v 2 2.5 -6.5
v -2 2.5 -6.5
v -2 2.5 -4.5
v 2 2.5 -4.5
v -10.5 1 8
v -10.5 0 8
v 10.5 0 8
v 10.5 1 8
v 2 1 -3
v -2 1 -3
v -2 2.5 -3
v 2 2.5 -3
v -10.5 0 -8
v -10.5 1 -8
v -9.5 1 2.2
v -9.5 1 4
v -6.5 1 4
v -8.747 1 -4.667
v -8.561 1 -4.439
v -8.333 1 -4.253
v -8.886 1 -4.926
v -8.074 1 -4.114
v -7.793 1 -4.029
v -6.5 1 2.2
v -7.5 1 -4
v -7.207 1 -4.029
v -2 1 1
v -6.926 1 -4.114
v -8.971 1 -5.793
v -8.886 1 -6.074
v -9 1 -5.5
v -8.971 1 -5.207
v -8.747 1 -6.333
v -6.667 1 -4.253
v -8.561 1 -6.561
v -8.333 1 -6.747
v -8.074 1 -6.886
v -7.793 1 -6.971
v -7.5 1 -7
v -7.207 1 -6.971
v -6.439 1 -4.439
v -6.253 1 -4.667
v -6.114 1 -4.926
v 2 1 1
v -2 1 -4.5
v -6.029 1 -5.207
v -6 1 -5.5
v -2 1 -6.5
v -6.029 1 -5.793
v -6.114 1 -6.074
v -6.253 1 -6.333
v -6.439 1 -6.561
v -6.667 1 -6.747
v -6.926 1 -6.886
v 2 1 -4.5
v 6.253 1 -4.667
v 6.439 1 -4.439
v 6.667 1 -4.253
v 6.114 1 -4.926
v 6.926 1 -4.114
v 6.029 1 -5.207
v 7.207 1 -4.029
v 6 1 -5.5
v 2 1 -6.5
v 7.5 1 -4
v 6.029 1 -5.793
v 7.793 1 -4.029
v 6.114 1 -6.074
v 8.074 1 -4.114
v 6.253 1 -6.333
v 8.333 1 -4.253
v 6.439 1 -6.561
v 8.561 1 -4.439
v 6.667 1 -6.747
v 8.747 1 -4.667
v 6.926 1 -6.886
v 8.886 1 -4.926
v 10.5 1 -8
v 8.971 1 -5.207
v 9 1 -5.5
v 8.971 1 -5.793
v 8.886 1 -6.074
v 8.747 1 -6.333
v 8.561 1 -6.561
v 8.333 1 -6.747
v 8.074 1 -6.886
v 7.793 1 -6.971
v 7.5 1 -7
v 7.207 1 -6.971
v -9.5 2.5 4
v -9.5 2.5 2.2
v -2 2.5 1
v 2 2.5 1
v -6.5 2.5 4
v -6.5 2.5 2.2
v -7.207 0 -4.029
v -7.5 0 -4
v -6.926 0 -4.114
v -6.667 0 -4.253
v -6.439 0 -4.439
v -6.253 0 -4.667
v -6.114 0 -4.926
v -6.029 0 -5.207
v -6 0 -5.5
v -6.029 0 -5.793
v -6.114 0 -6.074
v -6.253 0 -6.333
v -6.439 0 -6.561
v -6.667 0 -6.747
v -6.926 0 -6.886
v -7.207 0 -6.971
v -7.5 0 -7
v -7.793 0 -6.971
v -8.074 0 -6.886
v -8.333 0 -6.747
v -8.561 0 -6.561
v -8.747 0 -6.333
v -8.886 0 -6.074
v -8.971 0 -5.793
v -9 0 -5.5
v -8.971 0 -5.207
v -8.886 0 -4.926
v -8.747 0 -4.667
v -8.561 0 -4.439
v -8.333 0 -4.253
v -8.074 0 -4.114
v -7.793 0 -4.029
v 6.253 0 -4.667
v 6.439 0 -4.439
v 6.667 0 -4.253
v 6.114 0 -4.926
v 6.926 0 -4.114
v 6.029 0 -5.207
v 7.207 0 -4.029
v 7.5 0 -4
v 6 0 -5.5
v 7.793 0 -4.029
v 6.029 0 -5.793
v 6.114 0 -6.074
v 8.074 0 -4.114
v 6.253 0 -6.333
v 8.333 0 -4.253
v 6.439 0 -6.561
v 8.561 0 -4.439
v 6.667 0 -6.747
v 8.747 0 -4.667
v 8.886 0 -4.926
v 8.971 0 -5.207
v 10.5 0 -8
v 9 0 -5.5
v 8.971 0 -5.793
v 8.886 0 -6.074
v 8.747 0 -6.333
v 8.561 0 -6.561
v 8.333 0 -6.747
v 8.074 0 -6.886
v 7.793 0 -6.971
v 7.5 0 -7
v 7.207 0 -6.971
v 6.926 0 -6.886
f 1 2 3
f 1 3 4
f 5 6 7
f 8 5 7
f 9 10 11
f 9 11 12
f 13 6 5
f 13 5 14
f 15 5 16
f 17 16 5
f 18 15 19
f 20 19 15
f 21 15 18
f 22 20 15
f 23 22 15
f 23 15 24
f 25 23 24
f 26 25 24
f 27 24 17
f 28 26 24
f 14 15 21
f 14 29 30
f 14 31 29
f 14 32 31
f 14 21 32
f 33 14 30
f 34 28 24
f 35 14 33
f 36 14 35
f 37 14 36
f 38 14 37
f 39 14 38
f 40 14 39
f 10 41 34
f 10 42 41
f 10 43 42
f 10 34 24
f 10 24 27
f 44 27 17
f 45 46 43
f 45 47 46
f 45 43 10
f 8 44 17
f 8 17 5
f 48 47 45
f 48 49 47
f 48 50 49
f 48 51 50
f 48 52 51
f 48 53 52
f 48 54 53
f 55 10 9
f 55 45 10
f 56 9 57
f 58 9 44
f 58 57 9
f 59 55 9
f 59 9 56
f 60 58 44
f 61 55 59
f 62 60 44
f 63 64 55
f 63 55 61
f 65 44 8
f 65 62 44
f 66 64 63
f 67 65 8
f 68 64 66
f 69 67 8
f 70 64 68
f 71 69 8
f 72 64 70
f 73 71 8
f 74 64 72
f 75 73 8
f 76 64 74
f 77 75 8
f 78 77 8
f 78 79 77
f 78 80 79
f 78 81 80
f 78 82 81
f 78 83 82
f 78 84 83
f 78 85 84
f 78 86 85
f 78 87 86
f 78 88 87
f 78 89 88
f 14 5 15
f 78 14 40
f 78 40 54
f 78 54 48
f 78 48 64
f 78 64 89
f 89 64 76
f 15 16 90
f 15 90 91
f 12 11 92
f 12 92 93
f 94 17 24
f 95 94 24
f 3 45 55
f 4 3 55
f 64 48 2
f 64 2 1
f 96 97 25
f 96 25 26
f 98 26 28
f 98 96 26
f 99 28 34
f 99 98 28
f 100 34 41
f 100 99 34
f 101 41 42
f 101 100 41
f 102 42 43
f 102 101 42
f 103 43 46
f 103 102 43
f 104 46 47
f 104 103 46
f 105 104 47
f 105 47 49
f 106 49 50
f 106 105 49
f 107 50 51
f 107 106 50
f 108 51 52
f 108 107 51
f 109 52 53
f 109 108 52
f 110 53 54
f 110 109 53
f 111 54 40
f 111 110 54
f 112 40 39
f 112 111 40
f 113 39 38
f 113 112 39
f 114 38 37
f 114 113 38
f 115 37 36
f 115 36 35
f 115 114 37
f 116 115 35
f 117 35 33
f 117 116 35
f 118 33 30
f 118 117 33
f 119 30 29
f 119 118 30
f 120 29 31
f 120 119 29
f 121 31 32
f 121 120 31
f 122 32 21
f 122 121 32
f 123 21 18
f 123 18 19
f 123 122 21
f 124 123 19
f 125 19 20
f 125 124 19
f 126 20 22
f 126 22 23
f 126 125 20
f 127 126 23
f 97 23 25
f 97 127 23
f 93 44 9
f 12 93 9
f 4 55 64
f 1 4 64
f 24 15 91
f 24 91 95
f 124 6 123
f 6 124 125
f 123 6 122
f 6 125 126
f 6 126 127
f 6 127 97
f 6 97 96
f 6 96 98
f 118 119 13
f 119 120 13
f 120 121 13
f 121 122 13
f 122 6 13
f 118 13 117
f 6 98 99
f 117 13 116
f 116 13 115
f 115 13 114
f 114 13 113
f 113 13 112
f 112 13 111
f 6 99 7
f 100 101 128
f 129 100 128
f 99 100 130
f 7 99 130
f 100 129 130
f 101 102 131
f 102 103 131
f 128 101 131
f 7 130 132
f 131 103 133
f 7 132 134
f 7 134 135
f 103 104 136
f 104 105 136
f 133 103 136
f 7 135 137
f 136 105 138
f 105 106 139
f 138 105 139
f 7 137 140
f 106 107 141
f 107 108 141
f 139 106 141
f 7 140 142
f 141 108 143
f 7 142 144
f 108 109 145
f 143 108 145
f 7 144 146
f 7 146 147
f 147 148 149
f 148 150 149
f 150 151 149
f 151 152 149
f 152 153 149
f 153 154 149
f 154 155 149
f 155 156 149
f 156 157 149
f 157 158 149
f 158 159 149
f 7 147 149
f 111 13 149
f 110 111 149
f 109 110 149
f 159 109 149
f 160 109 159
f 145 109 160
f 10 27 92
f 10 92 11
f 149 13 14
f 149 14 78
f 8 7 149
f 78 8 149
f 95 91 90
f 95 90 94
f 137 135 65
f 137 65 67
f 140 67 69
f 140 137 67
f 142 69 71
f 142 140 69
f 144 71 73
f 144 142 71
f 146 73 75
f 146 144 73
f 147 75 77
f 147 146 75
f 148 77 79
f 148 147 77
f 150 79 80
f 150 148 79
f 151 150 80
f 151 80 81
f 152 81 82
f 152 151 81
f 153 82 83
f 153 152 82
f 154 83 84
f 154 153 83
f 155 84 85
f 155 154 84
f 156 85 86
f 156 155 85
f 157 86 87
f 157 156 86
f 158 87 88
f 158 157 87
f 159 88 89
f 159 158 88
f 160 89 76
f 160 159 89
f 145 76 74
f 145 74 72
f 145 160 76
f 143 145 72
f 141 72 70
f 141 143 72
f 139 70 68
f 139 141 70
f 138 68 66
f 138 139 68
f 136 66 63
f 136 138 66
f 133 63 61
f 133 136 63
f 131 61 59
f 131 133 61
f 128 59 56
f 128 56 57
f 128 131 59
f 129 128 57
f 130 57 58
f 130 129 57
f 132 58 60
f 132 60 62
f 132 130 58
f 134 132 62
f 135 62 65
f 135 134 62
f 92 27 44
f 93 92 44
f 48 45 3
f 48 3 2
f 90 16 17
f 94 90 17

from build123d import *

# Parameters (mm, degrees)
SKETCH1_W        = 21
SKETCH1_H        = 16
SKETCH1_R        = 1.5
PCB_DEPTH        = 1
SKETCH2_W        = 4
SKETCH2_H        = 4
SKETCH2_W_2      = 3
SKETCH2_H_2      = 1.8
COMPONENTS_DEPTH = 1.5
SKETCH3_W        = 4
SKETCH3_H        = 2
CAPACITOR_DEPTH  = 1.5


with BuildPart() as part:
    # Sketch1 → PCB (new body)
    with BuildSketch(Plane(origin=(0, 0, 0), x_dir=(1, 0, 0), z_dir=(0, 1, 0))):
        Rectangle(SKETCH1_W, SKETCH1_H)
        with Locations(Location((-7.5, 5.5, 0), (0, 0, 270))):
            Circle(SKETCH1_R, mode=Mode.SUBTRACT)
        with Locations(Location((7.5, 5.5, 0), (0, 0, 270))):
            Circle(SKETCH1_R, mode=Mode.SUBTRACT)
    extrude(amount=PCB_DEPTH)

    # Sketch2 → Components (add)
    with BuildSketch(Plane(origin=(0, 1, 0), x_dir=(1, 0, 0), z_dir=(0, 1, 0))):
        with Locations((0, 1)):
            Rectangle(SKETCH2_W, SKETCH2_H)
        with Locations((-8, -3.1)):
            Rectangle(SKETCH2_W_2, SKETCH2_H_2)
    extrude(amount=COMPONENTS_DEPTH)

    # Sketch3 → Capacitor (add)
    with BuildSketch(Plane(origin=(0, 1, 0), x_dir=(1, 0, 0), z_dir=(0, 1, 0))):
        with Locations((0, 5.5)):
            Rectangle(SKETCH3_W, SKETCH3_H)
    extrude(amount=CAPACITOR_DEPTH)


solid = part.part
